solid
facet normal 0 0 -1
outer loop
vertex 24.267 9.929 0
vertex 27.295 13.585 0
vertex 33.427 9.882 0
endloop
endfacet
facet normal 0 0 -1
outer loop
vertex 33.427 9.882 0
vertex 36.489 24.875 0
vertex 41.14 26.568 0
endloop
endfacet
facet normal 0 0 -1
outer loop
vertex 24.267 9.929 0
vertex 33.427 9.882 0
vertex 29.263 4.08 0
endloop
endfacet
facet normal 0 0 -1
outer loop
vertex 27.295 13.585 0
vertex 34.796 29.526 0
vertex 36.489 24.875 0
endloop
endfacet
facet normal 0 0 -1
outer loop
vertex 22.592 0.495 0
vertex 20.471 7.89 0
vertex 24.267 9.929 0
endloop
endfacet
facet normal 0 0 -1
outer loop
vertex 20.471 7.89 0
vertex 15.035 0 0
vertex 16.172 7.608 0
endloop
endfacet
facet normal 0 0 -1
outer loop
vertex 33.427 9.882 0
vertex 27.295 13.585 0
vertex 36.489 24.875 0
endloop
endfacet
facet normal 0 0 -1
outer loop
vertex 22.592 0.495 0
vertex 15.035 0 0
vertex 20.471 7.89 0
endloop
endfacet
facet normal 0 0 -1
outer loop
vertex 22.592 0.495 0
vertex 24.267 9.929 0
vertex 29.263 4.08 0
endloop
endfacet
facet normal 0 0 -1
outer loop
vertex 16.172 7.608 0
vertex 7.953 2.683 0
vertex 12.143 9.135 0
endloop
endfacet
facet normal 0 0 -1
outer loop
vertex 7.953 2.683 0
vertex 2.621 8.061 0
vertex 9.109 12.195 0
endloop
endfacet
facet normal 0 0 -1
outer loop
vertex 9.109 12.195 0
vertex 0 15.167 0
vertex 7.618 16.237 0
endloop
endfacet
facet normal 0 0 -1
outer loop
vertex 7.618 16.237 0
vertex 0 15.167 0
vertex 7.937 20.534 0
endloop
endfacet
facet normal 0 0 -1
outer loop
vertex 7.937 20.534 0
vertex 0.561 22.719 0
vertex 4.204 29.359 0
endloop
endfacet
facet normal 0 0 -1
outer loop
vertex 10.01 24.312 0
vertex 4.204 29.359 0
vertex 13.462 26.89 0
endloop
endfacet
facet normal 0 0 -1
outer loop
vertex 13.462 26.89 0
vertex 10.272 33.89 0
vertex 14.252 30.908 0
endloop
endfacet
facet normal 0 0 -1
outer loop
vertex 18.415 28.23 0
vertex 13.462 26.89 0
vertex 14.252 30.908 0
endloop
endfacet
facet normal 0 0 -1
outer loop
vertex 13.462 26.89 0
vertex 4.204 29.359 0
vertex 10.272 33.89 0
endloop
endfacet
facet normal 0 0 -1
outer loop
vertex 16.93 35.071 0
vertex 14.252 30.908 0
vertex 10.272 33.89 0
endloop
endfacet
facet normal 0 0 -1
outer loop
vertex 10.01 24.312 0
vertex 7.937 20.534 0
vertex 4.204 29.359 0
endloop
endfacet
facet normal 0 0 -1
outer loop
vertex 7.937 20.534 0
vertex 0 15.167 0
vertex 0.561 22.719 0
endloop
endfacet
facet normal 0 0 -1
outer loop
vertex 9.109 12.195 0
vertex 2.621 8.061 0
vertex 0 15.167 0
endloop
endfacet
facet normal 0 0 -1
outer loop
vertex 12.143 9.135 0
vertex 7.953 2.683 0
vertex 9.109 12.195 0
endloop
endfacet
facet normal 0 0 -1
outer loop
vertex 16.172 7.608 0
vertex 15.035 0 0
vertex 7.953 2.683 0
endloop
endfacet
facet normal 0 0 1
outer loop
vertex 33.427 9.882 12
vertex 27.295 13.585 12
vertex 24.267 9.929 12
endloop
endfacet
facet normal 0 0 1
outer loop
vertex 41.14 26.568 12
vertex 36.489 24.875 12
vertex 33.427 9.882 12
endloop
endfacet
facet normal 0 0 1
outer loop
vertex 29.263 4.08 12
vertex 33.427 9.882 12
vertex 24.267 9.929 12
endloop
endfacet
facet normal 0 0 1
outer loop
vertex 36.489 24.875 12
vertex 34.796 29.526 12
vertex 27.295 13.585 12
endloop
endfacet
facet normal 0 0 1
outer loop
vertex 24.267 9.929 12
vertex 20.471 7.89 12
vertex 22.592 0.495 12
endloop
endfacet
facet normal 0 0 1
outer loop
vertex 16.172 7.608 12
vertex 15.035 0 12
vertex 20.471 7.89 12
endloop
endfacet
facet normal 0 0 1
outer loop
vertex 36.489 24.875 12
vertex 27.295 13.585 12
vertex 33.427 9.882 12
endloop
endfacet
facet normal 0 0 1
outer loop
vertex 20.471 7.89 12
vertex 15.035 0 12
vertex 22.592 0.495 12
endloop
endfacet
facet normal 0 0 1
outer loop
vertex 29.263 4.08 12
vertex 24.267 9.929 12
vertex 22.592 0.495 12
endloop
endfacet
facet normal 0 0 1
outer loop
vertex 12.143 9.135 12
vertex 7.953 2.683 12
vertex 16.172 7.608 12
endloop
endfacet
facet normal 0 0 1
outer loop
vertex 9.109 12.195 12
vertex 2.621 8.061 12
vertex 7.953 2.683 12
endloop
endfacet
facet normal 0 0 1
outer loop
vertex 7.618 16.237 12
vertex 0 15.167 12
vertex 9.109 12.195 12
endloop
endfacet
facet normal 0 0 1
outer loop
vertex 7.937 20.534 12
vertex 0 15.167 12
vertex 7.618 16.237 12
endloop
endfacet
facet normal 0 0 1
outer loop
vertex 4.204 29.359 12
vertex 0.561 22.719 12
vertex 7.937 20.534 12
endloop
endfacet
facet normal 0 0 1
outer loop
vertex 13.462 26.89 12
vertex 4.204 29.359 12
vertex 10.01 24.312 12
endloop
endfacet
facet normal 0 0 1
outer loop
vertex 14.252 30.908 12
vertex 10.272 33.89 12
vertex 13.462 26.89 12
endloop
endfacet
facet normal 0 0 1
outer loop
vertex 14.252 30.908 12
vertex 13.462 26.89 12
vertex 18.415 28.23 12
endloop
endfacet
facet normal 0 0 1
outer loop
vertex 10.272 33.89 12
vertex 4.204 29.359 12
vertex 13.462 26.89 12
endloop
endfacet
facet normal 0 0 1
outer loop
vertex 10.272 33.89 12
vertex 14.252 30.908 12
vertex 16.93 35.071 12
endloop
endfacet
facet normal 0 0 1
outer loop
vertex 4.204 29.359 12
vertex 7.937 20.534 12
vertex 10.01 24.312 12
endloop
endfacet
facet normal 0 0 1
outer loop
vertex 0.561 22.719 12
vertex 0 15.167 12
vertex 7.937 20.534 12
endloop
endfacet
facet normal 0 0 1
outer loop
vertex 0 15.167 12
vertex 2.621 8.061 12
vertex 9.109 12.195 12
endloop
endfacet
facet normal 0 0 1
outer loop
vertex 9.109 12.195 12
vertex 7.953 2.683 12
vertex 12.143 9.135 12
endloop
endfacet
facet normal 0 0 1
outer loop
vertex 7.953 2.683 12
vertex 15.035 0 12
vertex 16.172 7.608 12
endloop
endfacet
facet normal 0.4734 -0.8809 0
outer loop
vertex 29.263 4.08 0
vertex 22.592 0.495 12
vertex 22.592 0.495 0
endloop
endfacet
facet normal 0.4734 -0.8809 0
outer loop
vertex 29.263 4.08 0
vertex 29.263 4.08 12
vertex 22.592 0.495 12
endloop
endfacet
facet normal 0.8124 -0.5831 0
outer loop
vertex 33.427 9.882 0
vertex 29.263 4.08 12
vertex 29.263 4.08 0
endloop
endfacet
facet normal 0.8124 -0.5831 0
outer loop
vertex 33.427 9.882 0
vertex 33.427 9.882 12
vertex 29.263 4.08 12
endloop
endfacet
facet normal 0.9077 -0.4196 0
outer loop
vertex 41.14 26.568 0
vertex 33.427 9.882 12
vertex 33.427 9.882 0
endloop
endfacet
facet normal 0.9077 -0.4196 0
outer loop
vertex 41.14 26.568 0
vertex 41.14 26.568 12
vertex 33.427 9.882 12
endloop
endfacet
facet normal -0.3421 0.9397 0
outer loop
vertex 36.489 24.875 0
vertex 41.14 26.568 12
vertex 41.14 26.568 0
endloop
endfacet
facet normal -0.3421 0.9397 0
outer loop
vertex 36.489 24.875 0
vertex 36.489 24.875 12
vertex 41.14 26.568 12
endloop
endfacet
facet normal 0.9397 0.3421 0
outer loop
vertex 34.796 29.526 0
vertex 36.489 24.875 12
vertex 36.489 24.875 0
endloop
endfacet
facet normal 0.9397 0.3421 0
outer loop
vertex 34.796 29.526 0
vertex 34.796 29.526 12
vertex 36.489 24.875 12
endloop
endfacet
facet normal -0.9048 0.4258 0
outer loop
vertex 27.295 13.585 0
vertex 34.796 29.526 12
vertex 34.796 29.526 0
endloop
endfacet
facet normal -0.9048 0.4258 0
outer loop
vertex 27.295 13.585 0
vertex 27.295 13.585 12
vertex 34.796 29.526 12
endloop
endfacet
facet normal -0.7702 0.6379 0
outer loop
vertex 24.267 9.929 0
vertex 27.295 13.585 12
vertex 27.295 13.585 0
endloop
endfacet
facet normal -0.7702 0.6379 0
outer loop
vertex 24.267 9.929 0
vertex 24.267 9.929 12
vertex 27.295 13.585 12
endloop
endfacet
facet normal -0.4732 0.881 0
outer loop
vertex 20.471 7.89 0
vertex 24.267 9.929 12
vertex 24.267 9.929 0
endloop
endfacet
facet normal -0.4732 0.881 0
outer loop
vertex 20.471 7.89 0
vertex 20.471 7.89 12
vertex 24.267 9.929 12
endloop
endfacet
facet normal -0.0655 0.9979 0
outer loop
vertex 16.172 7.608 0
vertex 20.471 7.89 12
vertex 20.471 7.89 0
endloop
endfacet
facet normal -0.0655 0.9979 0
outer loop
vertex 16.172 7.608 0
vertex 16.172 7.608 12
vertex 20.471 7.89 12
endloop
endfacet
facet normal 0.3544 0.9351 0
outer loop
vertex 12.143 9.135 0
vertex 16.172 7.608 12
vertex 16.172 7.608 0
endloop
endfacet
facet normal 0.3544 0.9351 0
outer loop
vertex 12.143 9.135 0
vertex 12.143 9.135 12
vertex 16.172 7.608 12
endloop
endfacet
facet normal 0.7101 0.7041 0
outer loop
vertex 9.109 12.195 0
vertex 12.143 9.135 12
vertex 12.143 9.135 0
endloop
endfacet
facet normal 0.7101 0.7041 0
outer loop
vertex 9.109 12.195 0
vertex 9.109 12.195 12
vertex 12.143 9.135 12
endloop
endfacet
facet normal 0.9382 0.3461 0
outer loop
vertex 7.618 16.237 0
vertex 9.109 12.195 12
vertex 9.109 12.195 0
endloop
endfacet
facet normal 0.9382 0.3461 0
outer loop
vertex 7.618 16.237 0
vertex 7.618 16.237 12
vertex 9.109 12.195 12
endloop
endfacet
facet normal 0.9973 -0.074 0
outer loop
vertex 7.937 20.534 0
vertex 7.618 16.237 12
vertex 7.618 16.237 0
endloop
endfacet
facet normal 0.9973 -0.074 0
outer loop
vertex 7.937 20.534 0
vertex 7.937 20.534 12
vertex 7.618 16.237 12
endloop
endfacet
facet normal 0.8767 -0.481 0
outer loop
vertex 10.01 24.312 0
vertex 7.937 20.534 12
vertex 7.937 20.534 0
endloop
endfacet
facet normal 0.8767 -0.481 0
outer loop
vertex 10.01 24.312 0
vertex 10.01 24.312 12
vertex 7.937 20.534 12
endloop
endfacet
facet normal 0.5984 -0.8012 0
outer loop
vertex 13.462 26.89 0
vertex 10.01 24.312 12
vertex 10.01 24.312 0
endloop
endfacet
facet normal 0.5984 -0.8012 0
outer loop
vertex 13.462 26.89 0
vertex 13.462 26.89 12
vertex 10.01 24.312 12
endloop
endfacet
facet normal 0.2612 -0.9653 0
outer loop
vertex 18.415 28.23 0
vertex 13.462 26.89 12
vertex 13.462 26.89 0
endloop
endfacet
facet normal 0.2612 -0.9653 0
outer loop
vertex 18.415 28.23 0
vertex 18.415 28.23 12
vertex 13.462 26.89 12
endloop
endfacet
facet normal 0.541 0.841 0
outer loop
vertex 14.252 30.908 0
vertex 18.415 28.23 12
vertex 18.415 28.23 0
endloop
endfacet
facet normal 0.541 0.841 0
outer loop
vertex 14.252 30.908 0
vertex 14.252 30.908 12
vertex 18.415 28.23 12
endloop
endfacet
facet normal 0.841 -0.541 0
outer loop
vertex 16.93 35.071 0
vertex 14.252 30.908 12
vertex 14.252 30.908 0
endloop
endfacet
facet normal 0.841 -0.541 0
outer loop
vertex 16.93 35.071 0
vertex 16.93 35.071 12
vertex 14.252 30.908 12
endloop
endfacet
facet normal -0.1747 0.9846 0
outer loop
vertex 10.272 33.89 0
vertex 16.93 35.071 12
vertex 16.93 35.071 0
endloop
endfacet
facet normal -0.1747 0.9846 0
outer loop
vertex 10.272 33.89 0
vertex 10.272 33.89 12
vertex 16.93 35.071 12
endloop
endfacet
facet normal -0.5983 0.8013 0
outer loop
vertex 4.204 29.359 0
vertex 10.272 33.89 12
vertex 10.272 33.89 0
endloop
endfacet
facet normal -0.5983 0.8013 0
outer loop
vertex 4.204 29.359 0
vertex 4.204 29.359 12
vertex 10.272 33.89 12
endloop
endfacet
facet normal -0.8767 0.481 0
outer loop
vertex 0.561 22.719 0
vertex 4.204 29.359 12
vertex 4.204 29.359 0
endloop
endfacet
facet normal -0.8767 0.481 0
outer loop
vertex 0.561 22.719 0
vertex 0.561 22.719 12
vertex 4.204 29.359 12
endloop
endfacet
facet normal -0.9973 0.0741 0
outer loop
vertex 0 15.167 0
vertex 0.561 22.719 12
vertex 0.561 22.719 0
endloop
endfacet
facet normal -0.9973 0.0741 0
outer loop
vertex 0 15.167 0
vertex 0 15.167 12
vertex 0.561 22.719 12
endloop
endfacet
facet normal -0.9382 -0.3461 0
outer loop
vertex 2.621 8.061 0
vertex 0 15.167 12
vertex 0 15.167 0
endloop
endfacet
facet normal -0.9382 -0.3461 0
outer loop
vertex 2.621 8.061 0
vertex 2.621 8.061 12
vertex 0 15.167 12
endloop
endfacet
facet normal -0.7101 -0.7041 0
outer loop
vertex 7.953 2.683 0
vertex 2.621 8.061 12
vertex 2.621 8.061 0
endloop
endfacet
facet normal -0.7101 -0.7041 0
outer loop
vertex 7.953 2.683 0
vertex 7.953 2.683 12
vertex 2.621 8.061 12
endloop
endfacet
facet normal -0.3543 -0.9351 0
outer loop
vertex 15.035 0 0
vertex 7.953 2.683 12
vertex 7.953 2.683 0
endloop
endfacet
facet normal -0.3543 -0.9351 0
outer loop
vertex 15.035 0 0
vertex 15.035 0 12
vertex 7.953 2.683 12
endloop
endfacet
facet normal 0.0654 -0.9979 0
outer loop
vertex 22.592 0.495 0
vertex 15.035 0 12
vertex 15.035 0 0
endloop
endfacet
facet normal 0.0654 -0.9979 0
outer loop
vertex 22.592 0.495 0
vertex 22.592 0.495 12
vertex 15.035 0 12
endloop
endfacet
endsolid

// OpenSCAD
$fn = 32;

// ----------------------------------------------------------------------
// Hook plate: curl radius 14 mm over 245 degrees, 7 mm thick band
// ----------------------------------------------------------------------

// --- parameters (mm) ---
profile_height = 12;      // extrusion height
profile_points = 26;      // points of the closed outline

profile = [[14.252, 30.908], [16.93, 35.071], [10.272, 33.89], [4.204, 29.359], [0.561, 22.719], [0, 15.167], [2.621, 8.061], [7.953, 2.683], [15.035, 0], [22.592, 0.495], [29.263, 4.08], [33.427, 9.882], [41.14, 26.568], [36.489, 24.875], [34.796, 29.526], [27.295, 13.585], [24.267, 9.929], [20.471, 7.89], [16.172, 7.608], [12.143, 9.135], [9.109, 12.195], [7.618, 16.237], [7.937, 20.534], [10.01, 24.312], [13.462, 26.89], [18.415, 28.23]];  // single closed polygon, 26 points, counter clockwise

// --- the one profile operation ---
linear_extrude(height = profile_height) polygon(points = profile);
